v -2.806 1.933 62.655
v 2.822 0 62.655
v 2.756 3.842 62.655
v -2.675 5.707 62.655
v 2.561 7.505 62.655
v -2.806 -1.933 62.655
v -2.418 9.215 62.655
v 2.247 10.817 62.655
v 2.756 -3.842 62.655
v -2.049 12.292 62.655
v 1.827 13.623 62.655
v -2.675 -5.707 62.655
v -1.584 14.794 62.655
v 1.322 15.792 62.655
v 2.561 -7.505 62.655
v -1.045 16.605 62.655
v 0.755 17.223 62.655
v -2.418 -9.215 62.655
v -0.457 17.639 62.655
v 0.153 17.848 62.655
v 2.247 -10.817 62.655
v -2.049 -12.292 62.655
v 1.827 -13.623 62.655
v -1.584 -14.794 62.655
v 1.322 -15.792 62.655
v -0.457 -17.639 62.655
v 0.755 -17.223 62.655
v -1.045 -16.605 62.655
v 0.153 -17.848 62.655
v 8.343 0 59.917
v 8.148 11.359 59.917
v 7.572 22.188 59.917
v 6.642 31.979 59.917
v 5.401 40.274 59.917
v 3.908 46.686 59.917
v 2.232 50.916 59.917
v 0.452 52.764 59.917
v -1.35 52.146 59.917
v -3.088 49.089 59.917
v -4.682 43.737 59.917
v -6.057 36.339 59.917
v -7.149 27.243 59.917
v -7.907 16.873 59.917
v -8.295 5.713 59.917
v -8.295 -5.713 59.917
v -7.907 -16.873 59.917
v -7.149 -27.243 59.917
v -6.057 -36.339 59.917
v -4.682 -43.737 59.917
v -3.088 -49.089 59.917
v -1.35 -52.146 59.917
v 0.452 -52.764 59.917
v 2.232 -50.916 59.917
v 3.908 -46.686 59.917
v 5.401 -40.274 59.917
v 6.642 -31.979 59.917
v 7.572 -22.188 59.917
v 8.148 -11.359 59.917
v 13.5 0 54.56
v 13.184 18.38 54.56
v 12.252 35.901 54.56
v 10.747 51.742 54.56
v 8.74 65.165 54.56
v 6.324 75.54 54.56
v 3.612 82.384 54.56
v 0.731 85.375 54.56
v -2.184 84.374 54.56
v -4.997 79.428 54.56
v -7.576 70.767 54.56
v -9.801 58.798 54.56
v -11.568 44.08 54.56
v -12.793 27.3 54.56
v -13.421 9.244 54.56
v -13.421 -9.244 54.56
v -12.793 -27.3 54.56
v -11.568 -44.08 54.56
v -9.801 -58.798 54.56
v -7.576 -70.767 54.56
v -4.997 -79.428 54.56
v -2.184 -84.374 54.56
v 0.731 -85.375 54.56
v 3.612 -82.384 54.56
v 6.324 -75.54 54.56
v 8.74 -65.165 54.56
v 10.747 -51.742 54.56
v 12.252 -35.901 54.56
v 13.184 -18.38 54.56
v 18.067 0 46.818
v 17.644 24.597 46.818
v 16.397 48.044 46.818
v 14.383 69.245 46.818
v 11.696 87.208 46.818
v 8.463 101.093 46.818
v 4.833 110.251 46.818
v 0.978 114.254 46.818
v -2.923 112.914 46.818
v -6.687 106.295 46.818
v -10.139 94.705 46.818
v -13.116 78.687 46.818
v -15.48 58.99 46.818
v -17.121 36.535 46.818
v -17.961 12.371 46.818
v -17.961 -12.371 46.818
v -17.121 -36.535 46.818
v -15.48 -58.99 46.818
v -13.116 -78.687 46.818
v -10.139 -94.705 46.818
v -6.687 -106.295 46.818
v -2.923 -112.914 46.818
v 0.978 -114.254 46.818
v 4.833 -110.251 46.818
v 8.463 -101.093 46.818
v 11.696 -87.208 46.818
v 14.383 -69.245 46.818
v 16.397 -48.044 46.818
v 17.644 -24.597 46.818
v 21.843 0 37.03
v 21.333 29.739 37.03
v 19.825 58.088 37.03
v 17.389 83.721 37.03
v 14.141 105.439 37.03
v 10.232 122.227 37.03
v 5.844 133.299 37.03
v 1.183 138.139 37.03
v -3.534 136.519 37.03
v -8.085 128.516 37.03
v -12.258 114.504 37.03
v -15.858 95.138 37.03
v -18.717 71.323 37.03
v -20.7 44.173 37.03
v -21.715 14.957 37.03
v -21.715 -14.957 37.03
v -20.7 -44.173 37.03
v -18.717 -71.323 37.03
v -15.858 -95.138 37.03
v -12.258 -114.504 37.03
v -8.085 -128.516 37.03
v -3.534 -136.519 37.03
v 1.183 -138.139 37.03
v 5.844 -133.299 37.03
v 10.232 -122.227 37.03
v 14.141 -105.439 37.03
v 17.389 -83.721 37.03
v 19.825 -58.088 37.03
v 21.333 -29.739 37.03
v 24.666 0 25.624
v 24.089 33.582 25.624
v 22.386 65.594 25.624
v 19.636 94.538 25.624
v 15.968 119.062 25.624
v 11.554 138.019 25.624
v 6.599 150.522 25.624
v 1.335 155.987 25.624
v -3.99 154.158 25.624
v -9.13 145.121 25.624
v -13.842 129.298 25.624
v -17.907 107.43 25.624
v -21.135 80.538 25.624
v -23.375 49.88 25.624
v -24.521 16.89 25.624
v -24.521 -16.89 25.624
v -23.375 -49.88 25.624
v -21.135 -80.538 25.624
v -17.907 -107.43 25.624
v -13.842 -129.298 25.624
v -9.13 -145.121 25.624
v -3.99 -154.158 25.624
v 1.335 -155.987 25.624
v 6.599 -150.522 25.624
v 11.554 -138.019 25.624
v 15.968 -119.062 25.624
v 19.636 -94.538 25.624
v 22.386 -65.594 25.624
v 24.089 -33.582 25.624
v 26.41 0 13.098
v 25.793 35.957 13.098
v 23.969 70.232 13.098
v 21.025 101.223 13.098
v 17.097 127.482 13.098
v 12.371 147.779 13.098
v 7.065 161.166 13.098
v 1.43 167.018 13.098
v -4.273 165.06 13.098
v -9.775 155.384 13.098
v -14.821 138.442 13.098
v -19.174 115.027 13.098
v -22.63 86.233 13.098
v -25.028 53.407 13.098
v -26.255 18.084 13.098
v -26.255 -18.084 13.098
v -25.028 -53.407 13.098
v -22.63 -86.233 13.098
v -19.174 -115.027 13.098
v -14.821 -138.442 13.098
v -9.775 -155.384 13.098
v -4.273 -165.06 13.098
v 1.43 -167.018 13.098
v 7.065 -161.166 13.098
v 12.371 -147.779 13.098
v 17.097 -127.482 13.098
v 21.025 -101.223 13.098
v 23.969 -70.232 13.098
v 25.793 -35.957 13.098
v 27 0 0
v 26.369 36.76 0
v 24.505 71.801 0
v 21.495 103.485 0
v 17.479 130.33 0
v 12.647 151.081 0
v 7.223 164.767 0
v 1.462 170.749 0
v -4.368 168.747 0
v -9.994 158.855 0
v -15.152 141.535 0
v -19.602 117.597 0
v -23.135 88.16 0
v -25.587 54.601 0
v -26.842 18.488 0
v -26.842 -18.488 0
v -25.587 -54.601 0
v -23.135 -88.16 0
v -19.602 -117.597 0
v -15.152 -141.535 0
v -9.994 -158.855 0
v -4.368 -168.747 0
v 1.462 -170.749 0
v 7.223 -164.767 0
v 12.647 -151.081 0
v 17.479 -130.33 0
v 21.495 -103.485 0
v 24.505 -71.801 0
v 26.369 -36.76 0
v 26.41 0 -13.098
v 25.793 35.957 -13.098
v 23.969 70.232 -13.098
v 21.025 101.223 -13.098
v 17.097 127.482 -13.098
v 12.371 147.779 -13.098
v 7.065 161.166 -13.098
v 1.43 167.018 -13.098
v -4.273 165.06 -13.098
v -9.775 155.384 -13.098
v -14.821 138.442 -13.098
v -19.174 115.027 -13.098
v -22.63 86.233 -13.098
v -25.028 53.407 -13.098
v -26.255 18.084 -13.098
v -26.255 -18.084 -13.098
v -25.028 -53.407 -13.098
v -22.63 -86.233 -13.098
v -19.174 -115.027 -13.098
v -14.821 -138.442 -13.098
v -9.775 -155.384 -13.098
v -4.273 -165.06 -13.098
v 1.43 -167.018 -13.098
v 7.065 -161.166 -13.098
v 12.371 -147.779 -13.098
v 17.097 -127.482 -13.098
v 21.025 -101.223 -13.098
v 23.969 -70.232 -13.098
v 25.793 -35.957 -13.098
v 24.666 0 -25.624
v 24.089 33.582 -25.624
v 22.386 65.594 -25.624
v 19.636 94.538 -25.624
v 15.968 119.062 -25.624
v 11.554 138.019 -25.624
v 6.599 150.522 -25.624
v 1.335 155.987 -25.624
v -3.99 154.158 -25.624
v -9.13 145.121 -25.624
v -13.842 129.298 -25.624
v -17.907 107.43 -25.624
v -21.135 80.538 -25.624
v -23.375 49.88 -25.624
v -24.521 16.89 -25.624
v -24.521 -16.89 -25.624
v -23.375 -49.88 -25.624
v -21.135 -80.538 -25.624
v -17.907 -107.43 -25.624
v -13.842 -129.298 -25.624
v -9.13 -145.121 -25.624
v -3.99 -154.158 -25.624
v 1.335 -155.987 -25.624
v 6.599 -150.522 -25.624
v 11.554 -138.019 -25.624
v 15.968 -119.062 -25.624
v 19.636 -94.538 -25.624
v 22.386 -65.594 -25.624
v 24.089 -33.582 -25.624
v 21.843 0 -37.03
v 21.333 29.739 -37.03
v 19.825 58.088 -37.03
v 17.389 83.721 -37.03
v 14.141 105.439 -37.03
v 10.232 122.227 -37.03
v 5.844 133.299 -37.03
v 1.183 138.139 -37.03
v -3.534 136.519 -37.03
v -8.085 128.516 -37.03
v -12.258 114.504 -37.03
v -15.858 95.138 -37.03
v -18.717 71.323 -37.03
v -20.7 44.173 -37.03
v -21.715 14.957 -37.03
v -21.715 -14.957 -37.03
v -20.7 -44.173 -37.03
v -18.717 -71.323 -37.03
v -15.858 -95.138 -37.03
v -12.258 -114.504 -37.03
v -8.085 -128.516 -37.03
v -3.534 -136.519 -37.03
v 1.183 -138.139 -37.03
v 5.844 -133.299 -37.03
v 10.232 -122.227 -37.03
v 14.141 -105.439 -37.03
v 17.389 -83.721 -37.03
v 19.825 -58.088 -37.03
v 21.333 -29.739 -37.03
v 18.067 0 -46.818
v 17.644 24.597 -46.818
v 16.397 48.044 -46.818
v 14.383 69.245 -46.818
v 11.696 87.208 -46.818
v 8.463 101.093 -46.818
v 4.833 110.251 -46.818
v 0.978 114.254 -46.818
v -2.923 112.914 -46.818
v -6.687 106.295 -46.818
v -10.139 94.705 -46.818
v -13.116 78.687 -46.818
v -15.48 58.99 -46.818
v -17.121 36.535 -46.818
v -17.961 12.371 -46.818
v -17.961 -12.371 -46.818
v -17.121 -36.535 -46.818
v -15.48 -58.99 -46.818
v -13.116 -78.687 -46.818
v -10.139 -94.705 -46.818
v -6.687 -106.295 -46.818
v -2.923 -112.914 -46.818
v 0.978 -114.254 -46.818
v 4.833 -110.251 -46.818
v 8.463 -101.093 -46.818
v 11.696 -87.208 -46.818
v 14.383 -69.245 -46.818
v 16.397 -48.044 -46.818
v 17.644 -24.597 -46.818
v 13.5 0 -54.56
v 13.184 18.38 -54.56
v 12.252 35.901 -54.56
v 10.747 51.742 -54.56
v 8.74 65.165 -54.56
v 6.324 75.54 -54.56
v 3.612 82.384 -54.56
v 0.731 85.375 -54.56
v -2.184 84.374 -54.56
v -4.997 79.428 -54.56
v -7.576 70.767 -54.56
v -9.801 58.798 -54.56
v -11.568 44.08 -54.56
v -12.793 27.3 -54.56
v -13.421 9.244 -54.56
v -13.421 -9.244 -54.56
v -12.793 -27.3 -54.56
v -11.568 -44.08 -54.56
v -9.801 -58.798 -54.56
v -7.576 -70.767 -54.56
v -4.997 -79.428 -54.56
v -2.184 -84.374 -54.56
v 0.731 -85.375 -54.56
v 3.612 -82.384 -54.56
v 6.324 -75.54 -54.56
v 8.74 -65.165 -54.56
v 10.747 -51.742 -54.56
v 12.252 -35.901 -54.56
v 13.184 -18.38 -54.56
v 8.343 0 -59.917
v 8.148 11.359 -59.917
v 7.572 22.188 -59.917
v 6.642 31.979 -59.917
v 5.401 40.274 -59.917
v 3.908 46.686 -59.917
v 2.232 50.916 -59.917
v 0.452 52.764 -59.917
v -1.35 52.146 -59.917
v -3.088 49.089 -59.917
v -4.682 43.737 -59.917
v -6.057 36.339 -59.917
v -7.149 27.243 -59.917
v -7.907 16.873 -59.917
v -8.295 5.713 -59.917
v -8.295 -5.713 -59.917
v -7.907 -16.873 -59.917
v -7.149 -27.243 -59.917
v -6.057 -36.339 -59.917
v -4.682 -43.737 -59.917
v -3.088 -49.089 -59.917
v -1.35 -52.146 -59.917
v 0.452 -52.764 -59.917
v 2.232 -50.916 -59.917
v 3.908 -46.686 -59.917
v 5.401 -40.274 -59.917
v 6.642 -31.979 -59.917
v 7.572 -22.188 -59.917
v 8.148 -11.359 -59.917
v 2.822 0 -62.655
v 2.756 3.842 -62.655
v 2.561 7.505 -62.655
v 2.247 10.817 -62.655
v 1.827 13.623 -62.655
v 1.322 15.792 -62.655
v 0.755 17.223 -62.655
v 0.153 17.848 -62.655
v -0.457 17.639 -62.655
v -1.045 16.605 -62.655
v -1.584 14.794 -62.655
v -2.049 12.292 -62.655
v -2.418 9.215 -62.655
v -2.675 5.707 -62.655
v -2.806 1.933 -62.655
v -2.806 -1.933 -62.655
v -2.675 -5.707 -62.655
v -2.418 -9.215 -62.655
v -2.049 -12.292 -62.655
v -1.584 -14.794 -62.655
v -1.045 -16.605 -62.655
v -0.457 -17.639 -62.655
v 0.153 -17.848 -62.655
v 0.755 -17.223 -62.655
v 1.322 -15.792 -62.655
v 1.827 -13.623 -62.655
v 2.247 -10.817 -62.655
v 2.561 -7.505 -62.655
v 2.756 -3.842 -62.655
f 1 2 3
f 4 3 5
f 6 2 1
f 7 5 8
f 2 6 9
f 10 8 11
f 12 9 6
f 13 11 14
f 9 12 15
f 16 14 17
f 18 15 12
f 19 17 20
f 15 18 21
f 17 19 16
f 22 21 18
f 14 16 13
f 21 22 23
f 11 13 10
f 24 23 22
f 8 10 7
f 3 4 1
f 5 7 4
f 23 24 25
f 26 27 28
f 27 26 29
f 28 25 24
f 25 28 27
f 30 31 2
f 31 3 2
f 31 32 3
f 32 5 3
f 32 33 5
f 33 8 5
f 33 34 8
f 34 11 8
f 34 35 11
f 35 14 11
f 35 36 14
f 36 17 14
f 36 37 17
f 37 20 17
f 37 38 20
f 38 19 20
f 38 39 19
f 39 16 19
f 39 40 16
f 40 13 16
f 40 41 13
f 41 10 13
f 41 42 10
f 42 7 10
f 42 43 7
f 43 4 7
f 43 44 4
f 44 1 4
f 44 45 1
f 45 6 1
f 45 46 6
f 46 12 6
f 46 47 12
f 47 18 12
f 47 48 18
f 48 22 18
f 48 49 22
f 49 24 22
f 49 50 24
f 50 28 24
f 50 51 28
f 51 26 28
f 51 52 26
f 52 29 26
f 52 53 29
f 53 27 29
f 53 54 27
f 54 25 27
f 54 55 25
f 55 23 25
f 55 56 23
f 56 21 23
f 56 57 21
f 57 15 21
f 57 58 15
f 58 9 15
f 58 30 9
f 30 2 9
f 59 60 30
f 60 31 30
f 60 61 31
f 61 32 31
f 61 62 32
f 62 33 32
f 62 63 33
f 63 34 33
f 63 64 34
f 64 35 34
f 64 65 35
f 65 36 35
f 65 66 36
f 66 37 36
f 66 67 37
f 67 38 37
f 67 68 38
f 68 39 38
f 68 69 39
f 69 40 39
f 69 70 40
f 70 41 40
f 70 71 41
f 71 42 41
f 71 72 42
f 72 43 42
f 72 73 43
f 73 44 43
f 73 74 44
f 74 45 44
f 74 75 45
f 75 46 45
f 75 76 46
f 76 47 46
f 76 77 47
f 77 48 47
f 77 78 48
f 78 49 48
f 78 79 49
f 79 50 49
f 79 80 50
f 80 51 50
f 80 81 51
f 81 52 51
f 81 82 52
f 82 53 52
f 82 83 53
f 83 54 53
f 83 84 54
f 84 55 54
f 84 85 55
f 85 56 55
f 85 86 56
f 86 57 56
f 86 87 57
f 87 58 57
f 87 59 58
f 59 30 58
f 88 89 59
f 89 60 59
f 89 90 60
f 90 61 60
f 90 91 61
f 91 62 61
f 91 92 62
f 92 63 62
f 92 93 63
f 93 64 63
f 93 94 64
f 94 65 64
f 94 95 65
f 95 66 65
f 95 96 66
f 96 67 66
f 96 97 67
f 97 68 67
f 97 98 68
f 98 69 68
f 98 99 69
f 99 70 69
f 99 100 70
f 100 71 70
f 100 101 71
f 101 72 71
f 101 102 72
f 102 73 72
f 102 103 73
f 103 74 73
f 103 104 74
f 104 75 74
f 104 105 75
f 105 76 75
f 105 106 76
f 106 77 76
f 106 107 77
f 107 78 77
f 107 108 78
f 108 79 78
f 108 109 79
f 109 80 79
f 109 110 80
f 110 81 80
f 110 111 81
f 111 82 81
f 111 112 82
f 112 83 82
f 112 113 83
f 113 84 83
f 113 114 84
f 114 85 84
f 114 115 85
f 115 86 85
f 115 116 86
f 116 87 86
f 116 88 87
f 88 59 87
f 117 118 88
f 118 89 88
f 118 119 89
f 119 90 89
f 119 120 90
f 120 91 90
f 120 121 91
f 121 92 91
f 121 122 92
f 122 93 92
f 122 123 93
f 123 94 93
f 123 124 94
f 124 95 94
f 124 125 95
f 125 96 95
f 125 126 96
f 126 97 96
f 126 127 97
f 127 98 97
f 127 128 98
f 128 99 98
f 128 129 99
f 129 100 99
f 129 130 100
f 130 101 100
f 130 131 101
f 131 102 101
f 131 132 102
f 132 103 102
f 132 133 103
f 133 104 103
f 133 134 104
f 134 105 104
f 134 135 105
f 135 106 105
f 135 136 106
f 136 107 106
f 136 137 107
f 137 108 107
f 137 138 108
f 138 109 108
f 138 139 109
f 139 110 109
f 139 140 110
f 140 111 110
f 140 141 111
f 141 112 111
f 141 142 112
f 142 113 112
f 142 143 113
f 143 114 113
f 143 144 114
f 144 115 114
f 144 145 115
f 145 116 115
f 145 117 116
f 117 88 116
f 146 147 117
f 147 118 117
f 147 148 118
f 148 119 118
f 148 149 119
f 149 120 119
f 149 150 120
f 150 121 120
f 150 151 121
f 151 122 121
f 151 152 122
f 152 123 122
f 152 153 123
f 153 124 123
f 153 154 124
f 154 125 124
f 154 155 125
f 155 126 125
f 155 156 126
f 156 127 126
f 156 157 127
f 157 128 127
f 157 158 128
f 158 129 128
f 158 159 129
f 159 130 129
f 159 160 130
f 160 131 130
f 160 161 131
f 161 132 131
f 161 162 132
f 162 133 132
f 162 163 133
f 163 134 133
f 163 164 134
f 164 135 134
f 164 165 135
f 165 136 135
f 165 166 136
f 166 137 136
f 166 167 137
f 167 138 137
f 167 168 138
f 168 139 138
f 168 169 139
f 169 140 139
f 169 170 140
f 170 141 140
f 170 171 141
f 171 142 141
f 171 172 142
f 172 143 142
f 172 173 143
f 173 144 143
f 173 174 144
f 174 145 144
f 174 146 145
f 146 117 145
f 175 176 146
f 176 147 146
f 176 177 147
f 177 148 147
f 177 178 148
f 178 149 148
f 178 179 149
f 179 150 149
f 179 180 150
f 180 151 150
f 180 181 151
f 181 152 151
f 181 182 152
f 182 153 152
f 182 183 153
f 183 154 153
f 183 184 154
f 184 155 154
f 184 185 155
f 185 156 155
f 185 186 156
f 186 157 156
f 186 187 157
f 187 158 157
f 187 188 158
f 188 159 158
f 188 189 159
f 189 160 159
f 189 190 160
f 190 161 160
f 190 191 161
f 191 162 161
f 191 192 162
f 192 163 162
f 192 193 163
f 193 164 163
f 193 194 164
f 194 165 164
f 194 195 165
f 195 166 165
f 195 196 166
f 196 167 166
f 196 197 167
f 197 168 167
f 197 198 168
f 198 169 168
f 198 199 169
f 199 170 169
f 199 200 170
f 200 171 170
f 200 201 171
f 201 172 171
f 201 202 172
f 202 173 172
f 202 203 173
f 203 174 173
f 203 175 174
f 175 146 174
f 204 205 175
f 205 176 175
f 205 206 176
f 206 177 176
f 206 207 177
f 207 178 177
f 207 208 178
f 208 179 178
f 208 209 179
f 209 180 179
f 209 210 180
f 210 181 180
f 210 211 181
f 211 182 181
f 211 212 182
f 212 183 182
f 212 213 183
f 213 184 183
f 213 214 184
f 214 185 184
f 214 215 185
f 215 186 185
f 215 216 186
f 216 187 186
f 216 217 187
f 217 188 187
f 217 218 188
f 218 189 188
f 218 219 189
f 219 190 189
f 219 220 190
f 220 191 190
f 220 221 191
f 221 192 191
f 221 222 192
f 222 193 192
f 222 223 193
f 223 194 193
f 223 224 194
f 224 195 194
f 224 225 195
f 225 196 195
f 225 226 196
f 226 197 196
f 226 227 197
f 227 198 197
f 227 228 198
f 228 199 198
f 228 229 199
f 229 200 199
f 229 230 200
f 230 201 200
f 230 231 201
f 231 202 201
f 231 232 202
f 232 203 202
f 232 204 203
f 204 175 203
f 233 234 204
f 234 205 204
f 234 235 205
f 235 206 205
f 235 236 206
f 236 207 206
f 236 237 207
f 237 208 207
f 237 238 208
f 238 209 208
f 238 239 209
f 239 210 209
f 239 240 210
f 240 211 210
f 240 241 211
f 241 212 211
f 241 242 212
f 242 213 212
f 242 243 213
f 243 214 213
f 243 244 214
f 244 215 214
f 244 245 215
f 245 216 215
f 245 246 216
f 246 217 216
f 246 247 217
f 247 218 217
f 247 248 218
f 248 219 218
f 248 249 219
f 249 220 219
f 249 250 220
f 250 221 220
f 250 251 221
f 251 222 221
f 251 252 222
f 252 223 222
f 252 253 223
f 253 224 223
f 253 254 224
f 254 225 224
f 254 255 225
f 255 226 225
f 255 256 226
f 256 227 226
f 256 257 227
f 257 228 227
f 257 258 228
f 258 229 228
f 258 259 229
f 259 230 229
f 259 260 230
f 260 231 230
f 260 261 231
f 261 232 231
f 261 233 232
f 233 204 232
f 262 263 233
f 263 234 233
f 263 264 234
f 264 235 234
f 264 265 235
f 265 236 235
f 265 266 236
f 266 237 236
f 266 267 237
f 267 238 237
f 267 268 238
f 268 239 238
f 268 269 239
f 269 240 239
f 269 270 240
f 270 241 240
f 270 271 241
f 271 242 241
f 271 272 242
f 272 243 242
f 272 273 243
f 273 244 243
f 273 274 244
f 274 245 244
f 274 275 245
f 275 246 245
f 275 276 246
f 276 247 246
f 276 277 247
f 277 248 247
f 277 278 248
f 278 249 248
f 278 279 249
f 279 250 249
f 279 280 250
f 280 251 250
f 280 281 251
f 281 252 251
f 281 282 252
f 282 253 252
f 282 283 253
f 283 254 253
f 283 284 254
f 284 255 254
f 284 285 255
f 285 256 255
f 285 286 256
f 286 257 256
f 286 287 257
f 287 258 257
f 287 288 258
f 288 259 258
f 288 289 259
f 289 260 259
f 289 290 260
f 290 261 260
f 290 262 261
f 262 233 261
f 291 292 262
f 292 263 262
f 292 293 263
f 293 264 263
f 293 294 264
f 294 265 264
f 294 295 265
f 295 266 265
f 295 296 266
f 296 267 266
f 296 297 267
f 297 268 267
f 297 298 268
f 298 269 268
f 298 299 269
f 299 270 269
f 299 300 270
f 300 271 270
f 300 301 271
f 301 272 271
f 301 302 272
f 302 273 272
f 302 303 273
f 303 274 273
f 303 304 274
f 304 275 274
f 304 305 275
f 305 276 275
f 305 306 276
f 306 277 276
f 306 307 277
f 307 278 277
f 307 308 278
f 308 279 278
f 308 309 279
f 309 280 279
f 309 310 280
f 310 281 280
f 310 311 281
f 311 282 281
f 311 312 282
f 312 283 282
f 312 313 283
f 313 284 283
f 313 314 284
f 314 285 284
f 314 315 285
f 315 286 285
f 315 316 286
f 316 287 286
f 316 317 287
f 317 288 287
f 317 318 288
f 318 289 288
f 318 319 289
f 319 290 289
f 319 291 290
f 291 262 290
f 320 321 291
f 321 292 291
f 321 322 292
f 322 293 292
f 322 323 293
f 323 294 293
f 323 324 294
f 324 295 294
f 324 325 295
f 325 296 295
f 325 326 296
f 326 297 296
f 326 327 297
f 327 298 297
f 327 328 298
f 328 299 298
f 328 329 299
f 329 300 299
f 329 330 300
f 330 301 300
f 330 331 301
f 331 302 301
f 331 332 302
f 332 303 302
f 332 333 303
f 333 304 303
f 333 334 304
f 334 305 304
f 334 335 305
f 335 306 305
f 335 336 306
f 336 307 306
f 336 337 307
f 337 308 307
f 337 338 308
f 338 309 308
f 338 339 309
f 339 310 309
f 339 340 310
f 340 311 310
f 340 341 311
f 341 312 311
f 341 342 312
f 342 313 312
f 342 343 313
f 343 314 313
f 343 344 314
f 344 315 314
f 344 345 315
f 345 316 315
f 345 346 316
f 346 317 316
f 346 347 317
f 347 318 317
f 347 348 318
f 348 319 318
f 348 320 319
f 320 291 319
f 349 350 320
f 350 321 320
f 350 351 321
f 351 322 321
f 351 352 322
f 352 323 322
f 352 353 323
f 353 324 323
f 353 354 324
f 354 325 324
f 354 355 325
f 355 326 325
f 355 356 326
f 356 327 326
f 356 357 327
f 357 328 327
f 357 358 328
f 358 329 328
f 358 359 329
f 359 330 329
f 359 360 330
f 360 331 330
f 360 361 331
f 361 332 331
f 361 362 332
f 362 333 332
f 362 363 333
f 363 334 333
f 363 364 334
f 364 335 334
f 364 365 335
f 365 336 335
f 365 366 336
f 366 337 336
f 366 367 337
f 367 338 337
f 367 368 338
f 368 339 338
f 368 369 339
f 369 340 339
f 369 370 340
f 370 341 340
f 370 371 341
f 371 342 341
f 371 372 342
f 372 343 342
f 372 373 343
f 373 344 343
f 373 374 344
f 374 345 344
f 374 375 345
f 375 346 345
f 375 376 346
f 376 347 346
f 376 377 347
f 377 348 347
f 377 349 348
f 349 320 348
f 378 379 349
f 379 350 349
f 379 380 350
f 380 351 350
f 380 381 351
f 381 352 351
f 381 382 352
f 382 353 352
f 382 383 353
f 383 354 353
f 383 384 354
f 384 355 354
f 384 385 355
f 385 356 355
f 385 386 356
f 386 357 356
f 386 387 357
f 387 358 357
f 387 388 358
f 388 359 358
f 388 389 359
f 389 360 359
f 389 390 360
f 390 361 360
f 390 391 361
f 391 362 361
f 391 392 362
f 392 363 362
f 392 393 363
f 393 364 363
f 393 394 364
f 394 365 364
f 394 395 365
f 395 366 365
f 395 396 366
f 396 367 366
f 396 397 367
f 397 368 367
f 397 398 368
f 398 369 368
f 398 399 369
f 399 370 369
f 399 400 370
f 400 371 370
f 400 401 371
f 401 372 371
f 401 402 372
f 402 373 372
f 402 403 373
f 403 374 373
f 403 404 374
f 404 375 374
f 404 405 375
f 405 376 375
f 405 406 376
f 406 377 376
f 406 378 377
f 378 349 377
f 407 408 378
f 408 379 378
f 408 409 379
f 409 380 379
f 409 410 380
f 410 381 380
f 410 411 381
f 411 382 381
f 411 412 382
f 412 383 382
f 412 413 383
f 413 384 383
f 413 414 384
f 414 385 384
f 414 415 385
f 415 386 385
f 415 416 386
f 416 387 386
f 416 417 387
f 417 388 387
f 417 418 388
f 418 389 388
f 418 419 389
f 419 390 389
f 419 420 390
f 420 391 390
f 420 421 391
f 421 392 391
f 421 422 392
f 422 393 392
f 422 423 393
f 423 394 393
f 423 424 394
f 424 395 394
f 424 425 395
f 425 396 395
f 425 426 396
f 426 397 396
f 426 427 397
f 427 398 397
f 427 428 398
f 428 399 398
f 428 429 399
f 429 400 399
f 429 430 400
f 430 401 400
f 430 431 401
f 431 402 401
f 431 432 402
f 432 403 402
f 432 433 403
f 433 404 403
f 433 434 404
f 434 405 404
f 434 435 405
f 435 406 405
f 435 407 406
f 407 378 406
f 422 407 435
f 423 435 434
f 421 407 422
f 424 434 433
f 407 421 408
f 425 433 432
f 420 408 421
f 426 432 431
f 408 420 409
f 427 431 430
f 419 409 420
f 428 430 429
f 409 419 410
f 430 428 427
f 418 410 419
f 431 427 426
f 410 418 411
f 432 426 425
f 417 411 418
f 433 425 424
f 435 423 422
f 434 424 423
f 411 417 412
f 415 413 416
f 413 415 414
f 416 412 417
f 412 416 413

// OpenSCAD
// Generated by SolidPython 1.0.1 on 2020-07-29 00:46:46


scale(v = [3, 19, 7]) {
	sphere(r = 9);
}
/***********************************************
*********      SolidPython code:      **********
************************************************
 
# import packages: SolidPython
from solid import *
from solid.utils import *
from itertools import chain, combinations, permutations


class Resize:

    def __init__(self, scad_file):
        self.scad_file = scad_file
        #self.scad_file = import_scad(scad_file)
        # cone/cylinder param:
        self.r1 = 0
        self.r2 = 0
        self.h = 0
        # rectangular prism param:
        self.w = 0
        self.l = 0
        # ellipse param:
        self.r = 0

    # import OpenScad code (file name corresponds to shape)


    # classify shape + parameters
    def assign(self, param1, param2, param3):
        if self.scad_file == 'cone.scad':
            self.r1 = param1
            self.r2 = param2
            self.h = param3
        elif self.scad_file == 'cylinder.scad':
            self.r1 = param1
            self.r2 = param2
            self.h = param3
        elif self.scad_file == 'rectangularPrism.scad':
            self.h = param1
            self.l = param2
            self.w = param3
        else:
            self.r = param1
            self.h = param2

    # resize parameters
    def iterate(self):
        x = range(3, 20, 2)
        i = 1
        if self.scad_file == 'cone.scad':
            tempList = list(permutations(x, 2))
            for temp in tempList:
                param1 = temp[0]
                param2 = temp[1]
                filepath = 'produced_scad_files/' + 'cone' + str(param1) + '_' + str(param2) + '_' + '.scad'
                scad_render_to_file(cylinder(h=param1, r1=param2, r2=0), filepath)

        elif self.scad_file == 'cylinder.scad':
            tempList = list(permutations(x, 3))
            for temp in tempList:
                param1 = temp[0]
                param2 = temp[1]
                filepath = 'produced_scad_files/' + 'cylinder' + str(param1) + '_' + str(param2) + '_' + '.scad'
                scad_render_to_file(cylinder(h=param1, r1=param2, r2=param2), filepath)

        elif self.scad_file == 'rectangularPrism.scad':
            tempList = list(permutations(x, 3))
            for temp in tempList:
                param1 = temp[0]
                param2 = temp[1]
                param3 = temp[2]
                filepath = 'produced_scad_files/' + 'rectangularPrism' + str(param1) + '_' + str(param2) + '_' + str(
                    param3) + '.scad'
                scad_render_to_file(cube(size=(param1, param2, param3)), filepath)

        elif self.scad_file == 'ellipse.scad':
            tempList = list(permutations(x, 4))
            for temp in tempList:
                param1 = temp[0]
                param2 = temp[1]
                param3 = temp[2]
                param4 = temp[3]
                filepath = 'produced_scad_files/' + 'ellipse' + str(param1) + '_' + str(param2) + '_' + str(param3) + '_' + str(param4) + '.scad'
                scad_render_to_file(scale([param1, param2, param3])(sphere(r=param4)), filepath)

    def render_to_scadfile(self):
        scad_render_to_file(scad, 'example.scad') 
 
************************************************/
